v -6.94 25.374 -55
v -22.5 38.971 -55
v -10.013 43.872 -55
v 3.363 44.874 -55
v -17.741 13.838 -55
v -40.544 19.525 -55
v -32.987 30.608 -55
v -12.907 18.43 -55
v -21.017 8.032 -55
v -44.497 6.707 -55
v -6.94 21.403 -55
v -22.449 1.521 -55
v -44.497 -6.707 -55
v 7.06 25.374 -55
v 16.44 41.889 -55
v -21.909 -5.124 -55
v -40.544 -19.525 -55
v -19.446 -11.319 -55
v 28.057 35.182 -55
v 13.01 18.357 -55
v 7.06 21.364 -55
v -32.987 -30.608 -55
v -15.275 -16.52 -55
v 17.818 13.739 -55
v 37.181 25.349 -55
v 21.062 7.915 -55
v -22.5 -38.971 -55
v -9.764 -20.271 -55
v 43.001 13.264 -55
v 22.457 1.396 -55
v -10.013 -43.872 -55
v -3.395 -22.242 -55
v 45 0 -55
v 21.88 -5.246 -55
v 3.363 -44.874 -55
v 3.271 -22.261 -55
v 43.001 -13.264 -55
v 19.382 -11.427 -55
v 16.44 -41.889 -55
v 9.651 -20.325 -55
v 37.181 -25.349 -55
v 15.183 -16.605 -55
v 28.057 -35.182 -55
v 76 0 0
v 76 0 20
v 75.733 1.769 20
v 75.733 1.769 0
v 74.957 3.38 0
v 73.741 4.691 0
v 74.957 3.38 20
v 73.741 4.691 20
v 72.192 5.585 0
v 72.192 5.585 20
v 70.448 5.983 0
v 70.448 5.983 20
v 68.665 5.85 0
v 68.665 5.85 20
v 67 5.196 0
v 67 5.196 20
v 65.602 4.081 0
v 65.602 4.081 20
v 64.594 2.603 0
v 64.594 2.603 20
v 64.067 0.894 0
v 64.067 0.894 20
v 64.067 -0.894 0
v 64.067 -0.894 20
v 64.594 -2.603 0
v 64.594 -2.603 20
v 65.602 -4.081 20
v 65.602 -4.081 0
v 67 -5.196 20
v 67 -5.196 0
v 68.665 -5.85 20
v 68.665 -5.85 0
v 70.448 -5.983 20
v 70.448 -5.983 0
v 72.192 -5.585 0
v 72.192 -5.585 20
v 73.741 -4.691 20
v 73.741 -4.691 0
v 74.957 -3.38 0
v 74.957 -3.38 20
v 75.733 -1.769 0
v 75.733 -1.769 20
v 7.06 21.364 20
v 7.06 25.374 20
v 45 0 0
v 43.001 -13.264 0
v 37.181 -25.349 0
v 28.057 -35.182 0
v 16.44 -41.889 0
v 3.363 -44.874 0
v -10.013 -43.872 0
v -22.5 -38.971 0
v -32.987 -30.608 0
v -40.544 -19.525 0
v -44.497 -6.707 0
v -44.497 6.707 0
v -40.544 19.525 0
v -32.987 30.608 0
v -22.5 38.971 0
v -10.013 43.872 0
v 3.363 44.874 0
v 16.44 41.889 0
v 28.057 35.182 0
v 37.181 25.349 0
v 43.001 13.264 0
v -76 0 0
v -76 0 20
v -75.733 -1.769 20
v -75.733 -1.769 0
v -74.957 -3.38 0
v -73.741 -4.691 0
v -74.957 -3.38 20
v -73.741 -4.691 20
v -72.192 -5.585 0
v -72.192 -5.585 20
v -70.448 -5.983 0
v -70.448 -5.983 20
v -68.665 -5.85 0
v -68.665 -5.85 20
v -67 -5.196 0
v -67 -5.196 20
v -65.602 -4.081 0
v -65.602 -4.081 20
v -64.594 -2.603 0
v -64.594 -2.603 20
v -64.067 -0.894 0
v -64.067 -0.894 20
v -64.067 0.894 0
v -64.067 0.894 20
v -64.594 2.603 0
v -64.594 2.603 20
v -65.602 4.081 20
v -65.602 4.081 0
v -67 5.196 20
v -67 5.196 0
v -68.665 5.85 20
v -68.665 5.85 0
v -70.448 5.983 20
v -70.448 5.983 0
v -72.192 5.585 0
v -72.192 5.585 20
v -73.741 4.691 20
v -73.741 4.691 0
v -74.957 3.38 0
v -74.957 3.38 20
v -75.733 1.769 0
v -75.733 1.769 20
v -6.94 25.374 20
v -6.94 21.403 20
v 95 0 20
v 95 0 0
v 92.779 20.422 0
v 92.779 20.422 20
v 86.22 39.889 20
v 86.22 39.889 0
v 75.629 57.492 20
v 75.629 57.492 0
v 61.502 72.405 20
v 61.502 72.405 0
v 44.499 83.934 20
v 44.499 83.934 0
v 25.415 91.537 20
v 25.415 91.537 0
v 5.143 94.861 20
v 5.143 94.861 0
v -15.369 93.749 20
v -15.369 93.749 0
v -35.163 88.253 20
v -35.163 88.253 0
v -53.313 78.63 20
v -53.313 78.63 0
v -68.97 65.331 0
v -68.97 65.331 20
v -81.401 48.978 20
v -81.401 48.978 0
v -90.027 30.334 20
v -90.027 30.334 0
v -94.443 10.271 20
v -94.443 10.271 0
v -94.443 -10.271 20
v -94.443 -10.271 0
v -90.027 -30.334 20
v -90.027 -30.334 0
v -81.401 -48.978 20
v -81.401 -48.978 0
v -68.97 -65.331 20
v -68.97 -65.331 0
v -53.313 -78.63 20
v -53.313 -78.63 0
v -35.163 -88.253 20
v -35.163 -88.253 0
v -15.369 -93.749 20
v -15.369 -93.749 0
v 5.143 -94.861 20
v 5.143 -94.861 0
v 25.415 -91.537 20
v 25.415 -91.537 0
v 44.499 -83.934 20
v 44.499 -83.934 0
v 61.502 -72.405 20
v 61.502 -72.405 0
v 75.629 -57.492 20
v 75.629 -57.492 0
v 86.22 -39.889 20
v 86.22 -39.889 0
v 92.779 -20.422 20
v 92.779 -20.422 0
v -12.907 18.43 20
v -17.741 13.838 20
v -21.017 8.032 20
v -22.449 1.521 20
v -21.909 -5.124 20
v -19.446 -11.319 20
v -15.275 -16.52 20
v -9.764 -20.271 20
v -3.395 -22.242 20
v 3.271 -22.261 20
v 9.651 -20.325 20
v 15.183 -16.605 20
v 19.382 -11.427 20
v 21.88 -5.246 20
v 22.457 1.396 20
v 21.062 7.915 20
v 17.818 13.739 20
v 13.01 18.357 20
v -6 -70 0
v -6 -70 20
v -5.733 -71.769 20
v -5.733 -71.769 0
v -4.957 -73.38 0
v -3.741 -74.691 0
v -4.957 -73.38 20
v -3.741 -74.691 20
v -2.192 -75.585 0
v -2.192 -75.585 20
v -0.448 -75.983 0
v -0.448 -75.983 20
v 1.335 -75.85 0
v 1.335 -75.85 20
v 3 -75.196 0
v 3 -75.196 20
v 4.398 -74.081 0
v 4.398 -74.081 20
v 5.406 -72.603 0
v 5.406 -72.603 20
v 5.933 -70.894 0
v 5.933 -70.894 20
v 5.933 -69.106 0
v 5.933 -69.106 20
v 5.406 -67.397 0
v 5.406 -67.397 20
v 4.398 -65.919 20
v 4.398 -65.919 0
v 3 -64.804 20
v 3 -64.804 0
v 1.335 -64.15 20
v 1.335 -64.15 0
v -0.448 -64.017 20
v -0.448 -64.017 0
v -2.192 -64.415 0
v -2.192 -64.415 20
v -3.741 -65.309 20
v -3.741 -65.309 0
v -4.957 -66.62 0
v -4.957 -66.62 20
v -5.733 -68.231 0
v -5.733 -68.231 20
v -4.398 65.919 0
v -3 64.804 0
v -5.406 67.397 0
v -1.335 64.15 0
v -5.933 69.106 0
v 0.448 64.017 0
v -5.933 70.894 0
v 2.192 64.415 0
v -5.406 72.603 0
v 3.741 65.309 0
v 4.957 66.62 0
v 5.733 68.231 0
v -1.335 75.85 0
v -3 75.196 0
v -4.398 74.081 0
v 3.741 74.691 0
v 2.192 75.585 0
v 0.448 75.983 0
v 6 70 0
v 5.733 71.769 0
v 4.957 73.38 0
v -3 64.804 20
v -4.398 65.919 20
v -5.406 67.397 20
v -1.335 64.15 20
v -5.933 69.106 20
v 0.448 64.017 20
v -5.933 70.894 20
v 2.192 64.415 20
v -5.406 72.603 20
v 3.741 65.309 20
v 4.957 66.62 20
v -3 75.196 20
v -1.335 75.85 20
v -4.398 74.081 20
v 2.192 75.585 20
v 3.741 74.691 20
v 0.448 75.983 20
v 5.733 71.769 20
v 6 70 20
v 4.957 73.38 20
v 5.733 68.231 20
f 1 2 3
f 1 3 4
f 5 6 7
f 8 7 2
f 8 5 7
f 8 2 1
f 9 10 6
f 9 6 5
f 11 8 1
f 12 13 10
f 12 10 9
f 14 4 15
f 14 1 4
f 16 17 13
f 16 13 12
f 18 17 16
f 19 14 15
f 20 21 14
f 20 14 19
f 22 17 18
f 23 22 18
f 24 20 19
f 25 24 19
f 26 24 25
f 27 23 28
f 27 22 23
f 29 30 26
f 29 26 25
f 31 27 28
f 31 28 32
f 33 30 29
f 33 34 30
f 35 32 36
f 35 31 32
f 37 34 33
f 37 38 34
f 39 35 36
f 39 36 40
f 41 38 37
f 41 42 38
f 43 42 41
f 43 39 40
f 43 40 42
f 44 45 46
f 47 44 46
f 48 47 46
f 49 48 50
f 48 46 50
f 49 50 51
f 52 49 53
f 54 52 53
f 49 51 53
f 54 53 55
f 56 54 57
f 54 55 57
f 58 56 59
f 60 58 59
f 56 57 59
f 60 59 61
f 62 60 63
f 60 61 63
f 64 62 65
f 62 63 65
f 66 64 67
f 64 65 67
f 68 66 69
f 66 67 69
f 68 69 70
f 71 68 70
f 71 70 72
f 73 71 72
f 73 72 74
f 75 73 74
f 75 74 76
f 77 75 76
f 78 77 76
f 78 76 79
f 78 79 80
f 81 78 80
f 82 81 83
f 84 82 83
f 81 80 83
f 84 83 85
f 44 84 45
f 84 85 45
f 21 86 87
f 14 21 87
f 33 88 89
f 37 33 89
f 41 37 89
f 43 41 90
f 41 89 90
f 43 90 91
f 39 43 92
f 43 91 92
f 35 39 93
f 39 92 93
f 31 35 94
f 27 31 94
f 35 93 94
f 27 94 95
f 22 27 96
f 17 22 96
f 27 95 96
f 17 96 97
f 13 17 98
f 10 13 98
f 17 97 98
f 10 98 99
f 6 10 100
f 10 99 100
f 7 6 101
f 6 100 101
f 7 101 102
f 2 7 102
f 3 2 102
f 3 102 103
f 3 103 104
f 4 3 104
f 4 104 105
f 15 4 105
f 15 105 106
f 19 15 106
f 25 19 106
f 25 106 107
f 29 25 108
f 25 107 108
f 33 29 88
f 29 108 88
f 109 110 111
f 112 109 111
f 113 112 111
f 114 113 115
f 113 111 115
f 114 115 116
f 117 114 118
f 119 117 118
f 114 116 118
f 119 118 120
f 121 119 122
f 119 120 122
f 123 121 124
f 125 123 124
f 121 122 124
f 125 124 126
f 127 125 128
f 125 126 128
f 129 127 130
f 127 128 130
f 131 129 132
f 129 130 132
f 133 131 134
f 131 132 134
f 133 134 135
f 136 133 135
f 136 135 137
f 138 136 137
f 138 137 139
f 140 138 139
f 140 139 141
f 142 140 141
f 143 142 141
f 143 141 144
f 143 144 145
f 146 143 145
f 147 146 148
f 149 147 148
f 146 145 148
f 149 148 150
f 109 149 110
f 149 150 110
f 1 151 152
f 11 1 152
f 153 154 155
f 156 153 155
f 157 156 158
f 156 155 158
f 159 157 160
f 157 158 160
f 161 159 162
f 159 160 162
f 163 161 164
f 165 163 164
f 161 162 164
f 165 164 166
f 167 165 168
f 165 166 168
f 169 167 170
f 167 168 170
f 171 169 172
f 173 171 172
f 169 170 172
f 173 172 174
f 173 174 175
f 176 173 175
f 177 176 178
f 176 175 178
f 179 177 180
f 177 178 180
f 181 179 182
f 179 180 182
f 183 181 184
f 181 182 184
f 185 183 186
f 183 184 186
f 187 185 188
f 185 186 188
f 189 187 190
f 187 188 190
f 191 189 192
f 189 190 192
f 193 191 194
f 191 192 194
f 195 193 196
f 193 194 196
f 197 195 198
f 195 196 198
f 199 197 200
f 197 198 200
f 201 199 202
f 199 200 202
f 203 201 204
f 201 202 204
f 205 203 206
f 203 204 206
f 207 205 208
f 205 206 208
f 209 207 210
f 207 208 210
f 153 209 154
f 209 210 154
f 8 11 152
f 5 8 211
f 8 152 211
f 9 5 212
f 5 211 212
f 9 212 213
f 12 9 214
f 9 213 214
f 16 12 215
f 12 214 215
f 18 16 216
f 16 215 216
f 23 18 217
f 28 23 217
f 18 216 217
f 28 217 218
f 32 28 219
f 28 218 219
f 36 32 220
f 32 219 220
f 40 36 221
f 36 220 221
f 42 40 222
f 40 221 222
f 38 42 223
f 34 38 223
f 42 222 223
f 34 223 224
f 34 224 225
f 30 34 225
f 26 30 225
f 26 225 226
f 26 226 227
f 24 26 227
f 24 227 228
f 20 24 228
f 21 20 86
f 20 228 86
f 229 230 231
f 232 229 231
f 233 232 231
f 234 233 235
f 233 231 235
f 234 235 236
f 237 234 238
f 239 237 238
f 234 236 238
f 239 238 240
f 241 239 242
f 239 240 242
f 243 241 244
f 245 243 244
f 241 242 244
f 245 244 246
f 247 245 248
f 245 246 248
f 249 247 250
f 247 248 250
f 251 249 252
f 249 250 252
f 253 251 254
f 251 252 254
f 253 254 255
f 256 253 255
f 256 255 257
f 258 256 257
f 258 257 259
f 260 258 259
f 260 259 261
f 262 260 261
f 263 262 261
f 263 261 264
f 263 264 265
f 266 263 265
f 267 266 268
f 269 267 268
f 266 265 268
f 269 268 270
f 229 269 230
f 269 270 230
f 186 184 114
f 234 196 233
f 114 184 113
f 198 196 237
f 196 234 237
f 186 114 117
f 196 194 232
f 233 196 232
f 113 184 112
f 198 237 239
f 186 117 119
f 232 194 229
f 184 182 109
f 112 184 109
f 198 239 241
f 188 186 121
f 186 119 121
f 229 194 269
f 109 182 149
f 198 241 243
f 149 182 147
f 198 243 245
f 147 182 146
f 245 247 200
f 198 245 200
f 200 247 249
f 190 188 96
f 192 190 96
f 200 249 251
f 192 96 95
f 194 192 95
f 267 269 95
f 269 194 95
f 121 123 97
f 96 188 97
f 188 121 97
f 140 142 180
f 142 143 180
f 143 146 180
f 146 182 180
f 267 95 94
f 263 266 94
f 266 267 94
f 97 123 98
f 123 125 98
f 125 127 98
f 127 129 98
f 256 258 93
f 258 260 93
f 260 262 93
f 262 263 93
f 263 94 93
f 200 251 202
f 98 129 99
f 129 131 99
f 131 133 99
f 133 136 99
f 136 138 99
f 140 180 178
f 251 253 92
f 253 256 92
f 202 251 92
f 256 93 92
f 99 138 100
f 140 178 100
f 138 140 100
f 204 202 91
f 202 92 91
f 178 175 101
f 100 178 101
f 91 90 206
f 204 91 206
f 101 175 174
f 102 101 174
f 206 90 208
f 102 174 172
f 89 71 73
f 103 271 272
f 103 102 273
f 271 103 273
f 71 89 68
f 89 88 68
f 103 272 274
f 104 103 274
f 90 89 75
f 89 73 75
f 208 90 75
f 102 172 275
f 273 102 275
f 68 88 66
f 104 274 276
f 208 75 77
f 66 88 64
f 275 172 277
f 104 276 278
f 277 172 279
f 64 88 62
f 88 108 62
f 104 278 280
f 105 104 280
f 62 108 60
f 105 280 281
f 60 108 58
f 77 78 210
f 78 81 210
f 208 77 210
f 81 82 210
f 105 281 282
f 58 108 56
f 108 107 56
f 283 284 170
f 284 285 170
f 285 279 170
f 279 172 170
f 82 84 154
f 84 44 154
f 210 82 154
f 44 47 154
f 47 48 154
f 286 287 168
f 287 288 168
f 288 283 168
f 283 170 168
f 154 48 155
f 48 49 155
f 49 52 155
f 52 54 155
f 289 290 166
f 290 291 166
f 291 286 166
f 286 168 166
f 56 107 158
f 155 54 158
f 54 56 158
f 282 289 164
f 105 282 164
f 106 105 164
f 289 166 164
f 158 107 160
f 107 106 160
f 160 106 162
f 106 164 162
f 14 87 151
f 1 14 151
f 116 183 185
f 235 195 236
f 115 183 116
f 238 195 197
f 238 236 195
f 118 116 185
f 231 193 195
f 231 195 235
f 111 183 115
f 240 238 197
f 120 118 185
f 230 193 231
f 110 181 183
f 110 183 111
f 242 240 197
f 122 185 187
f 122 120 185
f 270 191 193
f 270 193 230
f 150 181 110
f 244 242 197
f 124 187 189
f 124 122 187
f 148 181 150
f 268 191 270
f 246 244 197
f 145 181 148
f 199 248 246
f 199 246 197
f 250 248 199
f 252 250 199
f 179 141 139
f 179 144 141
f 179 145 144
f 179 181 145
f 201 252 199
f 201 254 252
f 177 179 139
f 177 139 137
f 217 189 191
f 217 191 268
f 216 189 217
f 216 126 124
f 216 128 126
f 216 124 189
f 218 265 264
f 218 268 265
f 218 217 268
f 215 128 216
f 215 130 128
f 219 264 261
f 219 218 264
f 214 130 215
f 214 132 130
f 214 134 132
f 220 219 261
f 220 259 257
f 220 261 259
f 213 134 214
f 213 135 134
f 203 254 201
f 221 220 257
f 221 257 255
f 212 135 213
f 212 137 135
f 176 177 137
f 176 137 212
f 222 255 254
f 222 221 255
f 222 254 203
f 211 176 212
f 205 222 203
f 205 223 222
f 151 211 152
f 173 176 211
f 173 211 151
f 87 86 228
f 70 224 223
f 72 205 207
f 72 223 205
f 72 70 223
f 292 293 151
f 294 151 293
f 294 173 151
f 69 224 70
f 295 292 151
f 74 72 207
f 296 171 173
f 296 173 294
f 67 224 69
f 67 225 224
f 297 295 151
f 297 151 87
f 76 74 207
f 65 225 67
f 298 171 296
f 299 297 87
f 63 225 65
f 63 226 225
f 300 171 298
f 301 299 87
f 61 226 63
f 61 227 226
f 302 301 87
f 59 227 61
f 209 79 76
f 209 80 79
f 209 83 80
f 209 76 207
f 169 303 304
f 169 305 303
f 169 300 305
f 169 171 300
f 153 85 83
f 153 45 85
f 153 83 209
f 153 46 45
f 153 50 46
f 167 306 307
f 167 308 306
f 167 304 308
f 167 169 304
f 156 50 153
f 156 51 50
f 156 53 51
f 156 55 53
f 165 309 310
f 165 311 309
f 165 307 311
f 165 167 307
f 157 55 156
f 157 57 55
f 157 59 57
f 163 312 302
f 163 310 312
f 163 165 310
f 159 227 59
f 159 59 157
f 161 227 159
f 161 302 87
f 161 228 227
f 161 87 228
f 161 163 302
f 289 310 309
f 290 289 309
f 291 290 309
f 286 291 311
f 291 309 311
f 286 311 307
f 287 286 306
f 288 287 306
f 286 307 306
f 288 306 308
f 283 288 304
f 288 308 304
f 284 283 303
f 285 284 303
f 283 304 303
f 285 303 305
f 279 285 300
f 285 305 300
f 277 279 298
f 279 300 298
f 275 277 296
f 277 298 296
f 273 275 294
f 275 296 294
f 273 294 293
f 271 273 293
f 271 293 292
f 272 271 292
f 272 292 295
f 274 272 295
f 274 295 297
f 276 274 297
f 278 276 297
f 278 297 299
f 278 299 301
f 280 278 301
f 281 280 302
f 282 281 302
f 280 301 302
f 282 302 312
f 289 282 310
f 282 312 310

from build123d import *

# Parameters (mm, degrees)
SKETCH1_R           = 95
BOSS_EXTRUDE1_DEPTH = 20
SKETCH2_R           = 6
CUT_EXTRUDE1_DEPTH  = 20
SKETCH5_R           = 45
BOSS_EXTRUDE3_DEPTH = 55
CUT_EXTRUDE2_DEPTH  = 75


with BuildPart() as part:
    # Sketch1 → Boss-Extrude1 (new body)
    with BuildSketch(Plane.XY):
        Circle(SKETCH1_R)
    extrude(amount=BOSS_EXTRUDE1_DEPTH)

    # Sketch2 → Cut-Extrude1 (cut)
    with BuildSketch(Plane.XY.offset(20)):
        with Locations((0, 70)):
            Circle(SKETCH2_R)
        with Locations((70, 0)):
            Circle(SKETCH2_R)
        with Locations(Location((0, -70, 0), (0, 0, 180))):
            Circle(SKETCH2_R)
        with Locations(Location((-70, 0, 0), (0, 0, 180))):
            Circle(SKETCH2_R)
    extrude(amount=-CUT_EXTRUDE1_DEPTH, mode=Mode.SUBTRACT)

    # Sketch5 → Boss-Extrude3 (add)
    with BuildSketch(Plane(origin=(0, 0, 0), x_dir=(-1, 0, 0), z_dir=(0, 0, -1))):
        with Locations(Location((0, 0, 0), (0, 0, 180))):
            Circle(SKETCH5_R)
    extrude(amount=BOSS_EXTRUDE3_DEPTH)

    # Sketch3 → Cut-Extrude2 (cut)
    with BuildSketch(Plane.XY.offset(20)):
        with BuildLine():
            Line((-6.940265993, 22.474071895), (-6.940265993, 21.402866816))
            ThreePointArc((-6.940265993, 21.402866816), (-0.062853214, -22.49991221), (7.059734007, 21.363757997))
            Line((7.059734007, 21.363757997), (7.059734007, 22.474071895))
            Line((7.059734007, 22.474071895), (7.059734007, 25.374071895))
            Line((7.059734007, 25.374071895), (-6.940265993, 25.374071895))
            Line((-6.940265993, 25.374071895), (-6.940265993, 22.474071895))
        make_face()
    extrude(amount=-CUT_EXTRUDE2_DEPTH, mode=Mode.SUBTRACT)


solid = part.part
